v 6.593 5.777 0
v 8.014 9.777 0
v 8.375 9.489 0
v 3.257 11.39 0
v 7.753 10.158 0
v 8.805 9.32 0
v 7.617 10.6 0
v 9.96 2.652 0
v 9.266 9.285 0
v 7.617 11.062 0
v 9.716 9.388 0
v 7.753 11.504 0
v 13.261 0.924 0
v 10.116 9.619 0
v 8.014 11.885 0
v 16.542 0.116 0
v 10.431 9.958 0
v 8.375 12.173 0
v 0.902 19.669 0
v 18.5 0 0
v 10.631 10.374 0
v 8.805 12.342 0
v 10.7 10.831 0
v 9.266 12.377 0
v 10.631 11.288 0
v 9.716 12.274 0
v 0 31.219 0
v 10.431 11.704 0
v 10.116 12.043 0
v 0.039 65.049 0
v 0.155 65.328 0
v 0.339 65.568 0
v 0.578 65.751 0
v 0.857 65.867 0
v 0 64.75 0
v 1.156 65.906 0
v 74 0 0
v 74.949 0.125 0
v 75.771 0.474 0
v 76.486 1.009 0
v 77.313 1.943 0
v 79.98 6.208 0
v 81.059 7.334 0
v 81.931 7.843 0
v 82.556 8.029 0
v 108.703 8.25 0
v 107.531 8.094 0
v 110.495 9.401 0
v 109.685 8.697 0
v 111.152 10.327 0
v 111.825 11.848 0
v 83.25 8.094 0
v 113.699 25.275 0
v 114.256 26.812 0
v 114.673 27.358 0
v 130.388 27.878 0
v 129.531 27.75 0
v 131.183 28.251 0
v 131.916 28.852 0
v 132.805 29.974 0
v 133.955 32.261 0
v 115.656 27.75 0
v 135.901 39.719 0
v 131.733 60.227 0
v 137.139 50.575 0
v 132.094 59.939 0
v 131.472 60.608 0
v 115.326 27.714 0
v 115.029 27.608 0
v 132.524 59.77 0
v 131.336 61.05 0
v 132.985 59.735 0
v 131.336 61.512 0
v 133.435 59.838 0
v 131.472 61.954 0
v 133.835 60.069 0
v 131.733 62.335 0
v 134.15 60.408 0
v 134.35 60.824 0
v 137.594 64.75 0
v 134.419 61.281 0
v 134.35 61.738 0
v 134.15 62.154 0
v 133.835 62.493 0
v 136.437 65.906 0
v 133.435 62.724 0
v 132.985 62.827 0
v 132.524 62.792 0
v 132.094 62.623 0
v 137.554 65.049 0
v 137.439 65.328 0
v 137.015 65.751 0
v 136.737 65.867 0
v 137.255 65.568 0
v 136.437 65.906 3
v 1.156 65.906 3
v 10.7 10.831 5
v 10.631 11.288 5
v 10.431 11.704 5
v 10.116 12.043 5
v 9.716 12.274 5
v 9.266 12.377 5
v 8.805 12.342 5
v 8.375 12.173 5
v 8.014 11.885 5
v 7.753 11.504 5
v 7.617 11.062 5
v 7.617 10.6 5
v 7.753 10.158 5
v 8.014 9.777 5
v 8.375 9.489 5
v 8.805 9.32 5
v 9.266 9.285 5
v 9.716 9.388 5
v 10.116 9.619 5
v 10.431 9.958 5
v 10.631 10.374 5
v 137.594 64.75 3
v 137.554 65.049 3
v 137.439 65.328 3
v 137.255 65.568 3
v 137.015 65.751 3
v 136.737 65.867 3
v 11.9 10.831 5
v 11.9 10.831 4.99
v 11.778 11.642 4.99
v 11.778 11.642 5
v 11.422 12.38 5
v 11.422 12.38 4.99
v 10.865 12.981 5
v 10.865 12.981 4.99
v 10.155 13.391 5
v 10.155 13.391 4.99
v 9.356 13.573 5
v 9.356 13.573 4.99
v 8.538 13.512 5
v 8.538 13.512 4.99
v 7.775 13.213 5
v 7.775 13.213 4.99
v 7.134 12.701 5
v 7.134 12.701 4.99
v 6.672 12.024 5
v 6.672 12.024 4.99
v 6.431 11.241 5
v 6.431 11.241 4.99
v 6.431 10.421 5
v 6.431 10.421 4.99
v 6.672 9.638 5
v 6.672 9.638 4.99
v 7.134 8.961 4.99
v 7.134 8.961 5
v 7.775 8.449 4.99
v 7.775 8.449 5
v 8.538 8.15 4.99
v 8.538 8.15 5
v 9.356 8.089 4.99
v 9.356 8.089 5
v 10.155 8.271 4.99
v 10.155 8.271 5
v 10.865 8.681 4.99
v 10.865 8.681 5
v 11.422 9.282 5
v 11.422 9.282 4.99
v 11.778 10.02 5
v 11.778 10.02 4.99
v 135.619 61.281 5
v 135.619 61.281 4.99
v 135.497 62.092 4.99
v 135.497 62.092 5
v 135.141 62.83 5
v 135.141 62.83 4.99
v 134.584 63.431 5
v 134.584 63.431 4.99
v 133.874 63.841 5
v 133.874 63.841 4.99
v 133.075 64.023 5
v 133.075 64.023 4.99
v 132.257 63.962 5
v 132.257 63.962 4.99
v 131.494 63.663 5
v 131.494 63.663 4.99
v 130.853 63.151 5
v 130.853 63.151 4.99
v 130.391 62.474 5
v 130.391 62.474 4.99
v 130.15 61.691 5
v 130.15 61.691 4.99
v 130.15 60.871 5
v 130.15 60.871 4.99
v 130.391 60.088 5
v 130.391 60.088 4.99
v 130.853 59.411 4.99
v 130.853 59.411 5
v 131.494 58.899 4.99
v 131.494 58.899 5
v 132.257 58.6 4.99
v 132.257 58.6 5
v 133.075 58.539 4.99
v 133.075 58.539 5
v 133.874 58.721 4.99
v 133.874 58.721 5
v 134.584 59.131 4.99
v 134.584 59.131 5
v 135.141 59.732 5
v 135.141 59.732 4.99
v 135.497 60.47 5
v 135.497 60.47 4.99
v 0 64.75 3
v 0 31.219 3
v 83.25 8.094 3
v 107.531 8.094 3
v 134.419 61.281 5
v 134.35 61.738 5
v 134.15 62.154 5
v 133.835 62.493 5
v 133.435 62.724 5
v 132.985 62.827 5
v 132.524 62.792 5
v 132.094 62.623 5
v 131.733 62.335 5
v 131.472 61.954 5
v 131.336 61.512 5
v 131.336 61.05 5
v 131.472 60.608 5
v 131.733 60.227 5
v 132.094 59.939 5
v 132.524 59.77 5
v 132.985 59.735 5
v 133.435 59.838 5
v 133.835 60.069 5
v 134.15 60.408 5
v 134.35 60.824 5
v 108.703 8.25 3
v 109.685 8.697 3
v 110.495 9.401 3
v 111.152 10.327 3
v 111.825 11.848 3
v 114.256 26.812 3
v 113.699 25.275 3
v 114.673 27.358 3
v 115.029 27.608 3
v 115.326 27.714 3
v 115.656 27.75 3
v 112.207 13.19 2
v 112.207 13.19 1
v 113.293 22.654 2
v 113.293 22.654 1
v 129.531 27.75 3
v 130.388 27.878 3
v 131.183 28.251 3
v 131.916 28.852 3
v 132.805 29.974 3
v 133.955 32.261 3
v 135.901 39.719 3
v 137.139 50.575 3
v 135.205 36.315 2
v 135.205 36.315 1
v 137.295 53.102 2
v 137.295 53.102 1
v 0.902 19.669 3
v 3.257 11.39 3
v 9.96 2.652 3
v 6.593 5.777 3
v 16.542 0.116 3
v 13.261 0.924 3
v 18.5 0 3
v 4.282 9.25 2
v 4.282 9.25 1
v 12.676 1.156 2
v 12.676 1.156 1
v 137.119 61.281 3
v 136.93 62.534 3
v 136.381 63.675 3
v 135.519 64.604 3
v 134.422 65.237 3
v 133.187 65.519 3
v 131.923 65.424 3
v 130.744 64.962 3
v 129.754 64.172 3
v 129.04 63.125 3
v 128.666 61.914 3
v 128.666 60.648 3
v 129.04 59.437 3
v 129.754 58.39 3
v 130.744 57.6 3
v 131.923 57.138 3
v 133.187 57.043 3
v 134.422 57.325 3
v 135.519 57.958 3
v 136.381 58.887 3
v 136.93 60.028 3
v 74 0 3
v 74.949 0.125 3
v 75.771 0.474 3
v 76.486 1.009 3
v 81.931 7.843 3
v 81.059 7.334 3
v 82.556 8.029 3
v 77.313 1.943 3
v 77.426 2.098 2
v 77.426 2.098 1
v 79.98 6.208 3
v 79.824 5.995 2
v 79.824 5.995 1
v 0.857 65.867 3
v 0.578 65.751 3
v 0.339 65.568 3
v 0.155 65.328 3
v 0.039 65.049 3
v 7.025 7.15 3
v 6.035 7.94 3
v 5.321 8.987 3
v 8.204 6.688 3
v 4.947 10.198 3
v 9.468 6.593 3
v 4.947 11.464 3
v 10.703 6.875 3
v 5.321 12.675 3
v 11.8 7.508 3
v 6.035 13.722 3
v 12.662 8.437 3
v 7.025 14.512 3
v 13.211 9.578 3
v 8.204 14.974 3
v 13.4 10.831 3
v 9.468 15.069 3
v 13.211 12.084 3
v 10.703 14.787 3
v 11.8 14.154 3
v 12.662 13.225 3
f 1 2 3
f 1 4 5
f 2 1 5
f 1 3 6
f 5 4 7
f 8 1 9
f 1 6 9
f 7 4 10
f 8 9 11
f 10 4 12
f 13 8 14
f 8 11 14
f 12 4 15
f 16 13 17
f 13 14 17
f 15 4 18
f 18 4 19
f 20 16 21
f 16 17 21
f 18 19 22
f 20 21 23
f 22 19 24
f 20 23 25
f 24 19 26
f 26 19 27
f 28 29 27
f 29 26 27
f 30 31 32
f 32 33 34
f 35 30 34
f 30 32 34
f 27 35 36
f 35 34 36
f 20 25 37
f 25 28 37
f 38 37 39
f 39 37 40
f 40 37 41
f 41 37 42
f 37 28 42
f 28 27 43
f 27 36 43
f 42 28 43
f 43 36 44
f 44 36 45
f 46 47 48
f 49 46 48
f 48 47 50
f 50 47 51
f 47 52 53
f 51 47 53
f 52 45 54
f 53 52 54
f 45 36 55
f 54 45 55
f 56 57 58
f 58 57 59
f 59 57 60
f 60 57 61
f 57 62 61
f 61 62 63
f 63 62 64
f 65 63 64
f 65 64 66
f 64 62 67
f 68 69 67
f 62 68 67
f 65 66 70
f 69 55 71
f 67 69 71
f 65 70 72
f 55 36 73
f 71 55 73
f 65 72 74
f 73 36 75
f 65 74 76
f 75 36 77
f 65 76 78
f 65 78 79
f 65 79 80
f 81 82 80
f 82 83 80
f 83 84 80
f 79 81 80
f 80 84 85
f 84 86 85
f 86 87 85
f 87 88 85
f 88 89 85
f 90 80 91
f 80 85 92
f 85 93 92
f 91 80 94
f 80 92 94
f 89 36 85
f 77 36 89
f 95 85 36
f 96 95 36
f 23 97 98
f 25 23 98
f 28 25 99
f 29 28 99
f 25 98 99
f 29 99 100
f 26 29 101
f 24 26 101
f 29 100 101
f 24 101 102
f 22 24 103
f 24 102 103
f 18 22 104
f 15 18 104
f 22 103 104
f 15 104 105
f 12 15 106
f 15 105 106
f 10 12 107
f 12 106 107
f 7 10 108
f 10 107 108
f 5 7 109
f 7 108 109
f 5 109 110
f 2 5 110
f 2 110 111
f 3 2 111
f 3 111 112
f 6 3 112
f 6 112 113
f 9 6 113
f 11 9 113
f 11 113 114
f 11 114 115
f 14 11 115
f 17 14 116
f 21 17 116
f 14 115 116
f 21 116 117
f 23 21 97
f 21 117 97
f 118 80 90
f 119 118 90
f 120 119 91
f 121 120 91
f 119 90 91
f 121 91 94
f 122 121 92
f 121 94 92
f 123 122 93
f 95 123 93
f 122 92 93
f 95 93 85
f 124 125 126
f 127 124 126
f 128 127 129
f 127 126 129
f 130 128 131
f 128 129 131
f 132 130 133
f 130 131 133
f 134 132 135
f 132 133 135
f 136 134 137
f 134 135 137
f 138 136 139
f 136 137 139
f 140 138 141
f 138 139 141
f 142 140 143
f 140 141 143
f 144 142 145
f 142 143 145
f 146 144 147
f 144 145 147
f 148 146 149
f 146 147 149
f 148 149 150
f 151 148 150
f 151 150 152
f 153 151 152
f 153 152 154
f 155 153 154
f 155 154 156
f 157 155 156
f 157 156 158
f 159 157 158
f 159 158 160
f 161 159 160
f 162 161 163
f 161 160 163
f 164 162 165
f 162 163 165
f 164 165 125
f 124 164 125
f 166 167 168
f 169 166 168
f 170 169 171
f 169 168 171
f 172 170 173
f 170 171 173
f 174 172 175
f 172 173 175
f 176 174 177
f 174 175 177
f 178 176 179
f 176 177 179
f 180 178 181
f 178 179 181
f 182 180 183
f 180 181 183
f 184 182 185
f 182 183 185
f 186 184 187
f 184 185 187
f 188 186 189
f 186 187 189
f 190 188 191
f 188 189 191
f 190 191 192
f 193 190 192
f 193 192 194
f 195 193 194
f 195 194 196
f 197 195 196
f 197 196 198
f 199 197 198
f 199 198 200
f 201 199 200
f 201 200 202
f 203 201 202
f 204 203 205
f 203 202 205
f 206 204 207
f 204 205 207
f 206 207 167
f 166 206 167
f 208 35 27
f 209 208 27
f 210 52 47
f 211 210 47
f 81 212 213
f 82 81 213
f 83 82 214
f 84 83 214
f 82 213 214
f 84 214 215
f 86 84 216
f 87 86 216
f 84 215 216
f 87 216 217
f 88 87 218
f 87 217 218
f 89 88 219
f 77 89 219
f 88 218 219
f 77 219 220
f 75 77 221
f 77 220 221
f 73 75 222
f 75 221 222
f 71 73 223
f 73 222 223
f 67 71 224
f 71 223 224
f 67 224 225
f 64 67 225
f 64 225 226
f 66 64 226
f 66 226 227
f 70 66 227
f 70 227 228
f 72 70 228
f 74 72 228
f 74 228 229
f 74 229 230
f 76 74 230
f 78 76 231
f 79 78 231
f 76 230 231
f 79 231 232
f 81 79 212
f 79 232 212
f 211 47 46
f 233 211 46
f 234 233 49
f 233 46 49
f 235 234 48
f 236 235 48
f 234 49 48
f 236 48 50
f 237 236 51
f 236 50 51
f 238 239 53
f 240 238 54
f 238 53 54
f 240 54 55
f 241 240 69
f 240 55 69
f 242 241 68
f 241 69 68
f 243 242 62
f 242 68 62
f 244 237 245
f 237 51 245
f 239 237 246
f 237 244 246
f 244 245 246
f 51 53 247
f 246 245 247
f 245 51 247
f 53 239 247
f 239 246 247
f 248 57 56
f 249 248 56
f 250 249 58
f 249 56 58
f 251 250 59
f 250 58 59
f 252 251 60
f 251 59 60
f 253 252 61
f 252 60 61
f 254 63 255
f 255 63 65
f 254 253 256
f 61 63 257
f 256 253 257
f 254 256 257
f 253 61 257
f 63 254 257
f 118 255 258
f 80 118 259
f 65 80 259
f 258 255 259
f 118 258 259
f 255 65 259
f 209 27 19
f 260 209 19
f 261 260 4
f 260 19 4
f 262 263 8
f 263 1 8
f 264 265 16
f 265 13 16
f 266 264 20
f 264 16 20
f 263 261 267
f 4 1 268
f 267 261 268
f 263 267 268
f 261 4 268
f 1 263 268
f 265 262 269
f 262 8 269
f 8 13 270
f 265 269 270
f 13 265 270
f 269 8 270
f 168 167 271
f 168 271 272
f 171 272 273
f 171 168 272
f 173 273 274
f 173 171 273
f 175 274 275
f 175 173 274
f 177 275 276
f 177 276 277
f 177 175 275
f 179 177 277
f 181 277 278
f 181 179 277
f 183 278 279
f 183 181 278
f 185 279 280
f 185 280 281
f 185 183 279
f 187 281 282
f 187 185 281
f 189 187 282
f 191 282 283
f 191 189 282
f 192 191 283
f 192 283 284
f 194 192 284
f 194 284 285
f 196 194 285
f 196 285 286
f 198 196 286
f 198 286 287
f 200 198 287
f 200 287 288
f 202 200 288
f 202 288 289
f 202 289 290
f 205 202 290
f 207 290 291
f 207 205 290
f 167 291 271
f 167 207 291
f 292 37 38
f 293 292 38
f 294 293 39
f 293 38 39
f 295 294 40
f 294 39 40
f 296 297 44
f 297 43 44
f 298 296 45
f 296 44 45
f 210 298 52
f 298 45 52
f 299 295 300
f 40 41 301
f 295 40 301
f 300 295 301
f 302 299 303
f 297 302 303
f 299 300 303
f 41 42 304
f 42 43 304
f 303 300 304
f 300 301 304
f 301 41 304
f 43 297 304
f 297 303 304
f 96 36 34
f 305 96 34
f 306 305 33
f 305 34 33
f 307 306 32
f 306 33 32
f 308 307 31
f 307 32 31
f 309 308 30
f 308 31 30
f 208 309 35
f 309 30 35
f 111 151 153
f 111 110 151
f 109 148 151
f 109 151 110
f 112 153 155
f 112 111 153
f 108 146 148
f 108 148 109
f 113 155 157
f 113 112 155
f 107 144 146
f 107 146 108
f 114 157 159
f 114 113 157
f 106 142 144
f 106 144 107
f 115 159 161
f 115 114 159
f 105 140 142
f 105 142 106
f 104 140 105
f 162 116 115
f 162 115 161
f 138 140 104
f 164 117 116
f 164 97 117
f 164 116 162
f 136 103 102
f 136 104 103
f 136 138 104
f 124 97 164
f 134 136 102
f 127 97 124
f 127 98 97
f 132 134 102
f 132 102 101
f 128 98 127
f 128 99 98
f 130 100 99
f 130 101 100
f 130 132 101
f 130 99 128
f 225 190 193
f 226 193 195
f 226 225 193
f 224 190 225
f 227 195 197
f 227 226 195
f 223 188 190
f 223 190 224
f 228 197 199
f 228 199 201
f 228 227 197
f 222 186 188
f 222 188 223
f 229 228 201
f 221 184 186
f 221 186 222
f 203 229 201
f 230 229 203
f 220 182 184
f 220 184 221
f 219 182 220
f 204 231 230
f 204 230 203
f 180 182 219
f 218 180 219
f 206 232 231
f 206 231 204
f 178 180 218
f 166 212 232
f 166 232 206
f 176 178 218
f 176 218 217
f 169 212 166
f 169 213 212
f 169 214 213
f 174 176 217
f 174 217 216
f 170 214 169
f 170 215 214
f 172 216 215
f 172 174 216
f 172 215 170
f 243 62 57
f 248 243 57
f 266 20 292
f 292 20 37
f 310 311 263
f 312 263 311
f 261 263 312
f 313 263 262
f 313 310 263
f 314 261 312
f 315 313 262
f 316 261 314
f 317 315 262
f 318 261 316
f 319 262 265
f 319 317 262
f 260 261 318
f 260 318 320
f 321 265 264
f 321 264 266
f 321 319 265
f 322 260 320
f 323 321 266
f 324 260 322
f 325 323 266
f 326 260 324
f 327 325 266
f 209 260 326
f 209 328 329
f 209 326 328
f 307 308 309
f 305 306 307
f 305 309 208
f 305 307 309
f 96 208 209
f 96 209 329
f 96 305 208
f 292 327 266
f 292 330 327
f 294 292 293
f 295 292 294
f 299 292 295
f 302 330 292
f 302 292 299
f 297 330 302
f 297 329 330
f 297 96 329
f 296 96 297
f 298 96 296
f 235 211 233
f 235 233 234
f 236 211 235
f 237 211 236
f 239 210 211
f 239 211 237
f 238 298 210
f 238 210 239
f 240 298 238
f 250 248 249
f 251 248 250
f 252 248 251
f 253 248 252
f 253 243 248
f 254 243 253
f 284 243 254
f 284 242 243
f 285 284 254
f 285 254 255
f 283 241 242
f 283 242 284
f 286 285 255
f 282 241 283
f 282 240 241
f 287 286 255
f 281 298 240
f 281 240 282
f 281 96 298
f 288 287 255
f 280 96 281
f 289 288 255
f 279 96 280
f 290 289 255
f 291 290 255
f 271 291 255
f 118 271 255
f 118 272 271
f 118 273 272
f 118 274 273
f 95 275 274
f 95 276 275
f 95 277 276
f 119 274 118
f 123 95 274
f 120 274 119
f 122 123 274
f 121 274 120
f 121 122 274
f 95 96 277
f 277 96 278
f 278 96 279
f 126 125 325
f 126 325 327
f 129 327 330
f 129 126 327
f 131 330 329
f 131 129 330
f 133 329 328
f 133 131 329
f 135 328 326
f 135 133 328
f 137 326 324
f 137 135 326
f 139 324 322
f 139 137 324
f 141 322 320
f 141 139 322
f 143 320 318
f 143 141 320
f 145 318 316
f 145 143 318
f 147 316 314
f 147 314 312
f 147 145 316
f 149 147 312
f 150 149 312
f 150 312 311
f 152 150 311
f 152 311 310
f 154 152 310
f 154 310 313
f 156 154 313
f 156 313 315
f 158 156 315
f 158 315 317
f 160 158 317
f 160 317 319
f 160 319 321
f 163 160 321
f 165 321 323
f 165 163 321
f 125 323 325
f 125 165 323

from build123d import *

# Parameters (mm, degrees)
PAD_DEPTH     = 3
SKETCH002_R   = 2.75
PAD002_DEPTH  = 2
CHAMFER_SIZE2 = 1.99
CHAMFER_SIZE  = 1.5
SKETCH005_R   = 1.55
POCKET_DEPTH  = 5


with BuildPart() as part:
    # Sketch → Pad (new body)
    with BuildSketch(Plane.XY):
        with BuildLine():
            Line((0, 64.75), (0, 31.219))
            add(Edge.make_bspline(
                [(0, 31.219), (0, 0), (16.1875, 0), (18.5, 0)],
                knots=[0, 0, 0, 0, 1, 1, 1, 1], degree=3))
            Line((18.5, 0), (74, 0))
            add(Edge.make_bspline(
                [(74, 0), (78.625, 0), (78.625, 8.09375), (83.25, 8.09375)],
                knots=[0, 0, 0, 0, 1, 1, 1, 1], degree=3))
            Line((83.25, 8.09375), (107.531, 8.09375))
            add(Edge.make_bspline(
                [(107.531, 8.09375), (115.62475, 8.09375), (111.031, 27.74975), (115.656, 27.74975)],
                knots=[0, 0, 0, 0, 1, 1, 1, 1], degree=3))
            Line((115.656, 27.74975), (129.531, 27.74975))
            add(Edge.make_bspline(
                [(129.531, 27.74975), (137.5935, 27.74975), (137.5935, 60.125), (137.5935, 64.75)],
                knots=[0, 0, 0, 0, 1, 1, 1, 1], degree=3))
            ThreePointArc((137.5935, 64.75), (137.254842, 65.567592), (136.43725, 65.90625))
            Line((136.43725, 65.90625), (1.15625, 65.90625))
            ThreePointArc((1.15625, 65.90625), (0.338658, 65.567592), (0, 64.75))
        make_face()
    extrude(amount=PAD_DEPTH)

    # Sketch002 (on Face13 of Pad) → Pad002 (join)
    with BuildSketch(Plane.XY.offset(3)):
        with Locations((9.15, 10.831)):
            Circle(SKETCH002_R)
        with Locations((132.869, 61.281)):
            Circle(SKETCH002_R)
    extrude(amount=PAD002_DEPTH)

    # Chamfer
    chamfer_edges = [part.edges().sort_by_distance(p)[0] for p in [
        (6.4, 10.831, 3),
        (130.119, 61.281, 3),
    ]]
    chamfer_side = part.faces().sort_by_distance((63.310609, 35.968212, 3))[0]
    chamfer(chamfer_edges, length=CHAMFER_SIZE, length2=CHAMFER_SIZE2, reference=chamfer_side)

    # Sketch005 (on Face18 of Chamfer) → Pocket (cut)
    with BuildSketch(Plane.XY.offset(5)):
        with Locations((9.15, 10.831)):
            Circle(SKETCH005_R)
        with Locations((132.869, 61.281)):
            Circle(SKETCH005_R)
    extrude(amount=-POCKET_DEPTH, mode=Mode.SUBTRACT)


solid = part.part
